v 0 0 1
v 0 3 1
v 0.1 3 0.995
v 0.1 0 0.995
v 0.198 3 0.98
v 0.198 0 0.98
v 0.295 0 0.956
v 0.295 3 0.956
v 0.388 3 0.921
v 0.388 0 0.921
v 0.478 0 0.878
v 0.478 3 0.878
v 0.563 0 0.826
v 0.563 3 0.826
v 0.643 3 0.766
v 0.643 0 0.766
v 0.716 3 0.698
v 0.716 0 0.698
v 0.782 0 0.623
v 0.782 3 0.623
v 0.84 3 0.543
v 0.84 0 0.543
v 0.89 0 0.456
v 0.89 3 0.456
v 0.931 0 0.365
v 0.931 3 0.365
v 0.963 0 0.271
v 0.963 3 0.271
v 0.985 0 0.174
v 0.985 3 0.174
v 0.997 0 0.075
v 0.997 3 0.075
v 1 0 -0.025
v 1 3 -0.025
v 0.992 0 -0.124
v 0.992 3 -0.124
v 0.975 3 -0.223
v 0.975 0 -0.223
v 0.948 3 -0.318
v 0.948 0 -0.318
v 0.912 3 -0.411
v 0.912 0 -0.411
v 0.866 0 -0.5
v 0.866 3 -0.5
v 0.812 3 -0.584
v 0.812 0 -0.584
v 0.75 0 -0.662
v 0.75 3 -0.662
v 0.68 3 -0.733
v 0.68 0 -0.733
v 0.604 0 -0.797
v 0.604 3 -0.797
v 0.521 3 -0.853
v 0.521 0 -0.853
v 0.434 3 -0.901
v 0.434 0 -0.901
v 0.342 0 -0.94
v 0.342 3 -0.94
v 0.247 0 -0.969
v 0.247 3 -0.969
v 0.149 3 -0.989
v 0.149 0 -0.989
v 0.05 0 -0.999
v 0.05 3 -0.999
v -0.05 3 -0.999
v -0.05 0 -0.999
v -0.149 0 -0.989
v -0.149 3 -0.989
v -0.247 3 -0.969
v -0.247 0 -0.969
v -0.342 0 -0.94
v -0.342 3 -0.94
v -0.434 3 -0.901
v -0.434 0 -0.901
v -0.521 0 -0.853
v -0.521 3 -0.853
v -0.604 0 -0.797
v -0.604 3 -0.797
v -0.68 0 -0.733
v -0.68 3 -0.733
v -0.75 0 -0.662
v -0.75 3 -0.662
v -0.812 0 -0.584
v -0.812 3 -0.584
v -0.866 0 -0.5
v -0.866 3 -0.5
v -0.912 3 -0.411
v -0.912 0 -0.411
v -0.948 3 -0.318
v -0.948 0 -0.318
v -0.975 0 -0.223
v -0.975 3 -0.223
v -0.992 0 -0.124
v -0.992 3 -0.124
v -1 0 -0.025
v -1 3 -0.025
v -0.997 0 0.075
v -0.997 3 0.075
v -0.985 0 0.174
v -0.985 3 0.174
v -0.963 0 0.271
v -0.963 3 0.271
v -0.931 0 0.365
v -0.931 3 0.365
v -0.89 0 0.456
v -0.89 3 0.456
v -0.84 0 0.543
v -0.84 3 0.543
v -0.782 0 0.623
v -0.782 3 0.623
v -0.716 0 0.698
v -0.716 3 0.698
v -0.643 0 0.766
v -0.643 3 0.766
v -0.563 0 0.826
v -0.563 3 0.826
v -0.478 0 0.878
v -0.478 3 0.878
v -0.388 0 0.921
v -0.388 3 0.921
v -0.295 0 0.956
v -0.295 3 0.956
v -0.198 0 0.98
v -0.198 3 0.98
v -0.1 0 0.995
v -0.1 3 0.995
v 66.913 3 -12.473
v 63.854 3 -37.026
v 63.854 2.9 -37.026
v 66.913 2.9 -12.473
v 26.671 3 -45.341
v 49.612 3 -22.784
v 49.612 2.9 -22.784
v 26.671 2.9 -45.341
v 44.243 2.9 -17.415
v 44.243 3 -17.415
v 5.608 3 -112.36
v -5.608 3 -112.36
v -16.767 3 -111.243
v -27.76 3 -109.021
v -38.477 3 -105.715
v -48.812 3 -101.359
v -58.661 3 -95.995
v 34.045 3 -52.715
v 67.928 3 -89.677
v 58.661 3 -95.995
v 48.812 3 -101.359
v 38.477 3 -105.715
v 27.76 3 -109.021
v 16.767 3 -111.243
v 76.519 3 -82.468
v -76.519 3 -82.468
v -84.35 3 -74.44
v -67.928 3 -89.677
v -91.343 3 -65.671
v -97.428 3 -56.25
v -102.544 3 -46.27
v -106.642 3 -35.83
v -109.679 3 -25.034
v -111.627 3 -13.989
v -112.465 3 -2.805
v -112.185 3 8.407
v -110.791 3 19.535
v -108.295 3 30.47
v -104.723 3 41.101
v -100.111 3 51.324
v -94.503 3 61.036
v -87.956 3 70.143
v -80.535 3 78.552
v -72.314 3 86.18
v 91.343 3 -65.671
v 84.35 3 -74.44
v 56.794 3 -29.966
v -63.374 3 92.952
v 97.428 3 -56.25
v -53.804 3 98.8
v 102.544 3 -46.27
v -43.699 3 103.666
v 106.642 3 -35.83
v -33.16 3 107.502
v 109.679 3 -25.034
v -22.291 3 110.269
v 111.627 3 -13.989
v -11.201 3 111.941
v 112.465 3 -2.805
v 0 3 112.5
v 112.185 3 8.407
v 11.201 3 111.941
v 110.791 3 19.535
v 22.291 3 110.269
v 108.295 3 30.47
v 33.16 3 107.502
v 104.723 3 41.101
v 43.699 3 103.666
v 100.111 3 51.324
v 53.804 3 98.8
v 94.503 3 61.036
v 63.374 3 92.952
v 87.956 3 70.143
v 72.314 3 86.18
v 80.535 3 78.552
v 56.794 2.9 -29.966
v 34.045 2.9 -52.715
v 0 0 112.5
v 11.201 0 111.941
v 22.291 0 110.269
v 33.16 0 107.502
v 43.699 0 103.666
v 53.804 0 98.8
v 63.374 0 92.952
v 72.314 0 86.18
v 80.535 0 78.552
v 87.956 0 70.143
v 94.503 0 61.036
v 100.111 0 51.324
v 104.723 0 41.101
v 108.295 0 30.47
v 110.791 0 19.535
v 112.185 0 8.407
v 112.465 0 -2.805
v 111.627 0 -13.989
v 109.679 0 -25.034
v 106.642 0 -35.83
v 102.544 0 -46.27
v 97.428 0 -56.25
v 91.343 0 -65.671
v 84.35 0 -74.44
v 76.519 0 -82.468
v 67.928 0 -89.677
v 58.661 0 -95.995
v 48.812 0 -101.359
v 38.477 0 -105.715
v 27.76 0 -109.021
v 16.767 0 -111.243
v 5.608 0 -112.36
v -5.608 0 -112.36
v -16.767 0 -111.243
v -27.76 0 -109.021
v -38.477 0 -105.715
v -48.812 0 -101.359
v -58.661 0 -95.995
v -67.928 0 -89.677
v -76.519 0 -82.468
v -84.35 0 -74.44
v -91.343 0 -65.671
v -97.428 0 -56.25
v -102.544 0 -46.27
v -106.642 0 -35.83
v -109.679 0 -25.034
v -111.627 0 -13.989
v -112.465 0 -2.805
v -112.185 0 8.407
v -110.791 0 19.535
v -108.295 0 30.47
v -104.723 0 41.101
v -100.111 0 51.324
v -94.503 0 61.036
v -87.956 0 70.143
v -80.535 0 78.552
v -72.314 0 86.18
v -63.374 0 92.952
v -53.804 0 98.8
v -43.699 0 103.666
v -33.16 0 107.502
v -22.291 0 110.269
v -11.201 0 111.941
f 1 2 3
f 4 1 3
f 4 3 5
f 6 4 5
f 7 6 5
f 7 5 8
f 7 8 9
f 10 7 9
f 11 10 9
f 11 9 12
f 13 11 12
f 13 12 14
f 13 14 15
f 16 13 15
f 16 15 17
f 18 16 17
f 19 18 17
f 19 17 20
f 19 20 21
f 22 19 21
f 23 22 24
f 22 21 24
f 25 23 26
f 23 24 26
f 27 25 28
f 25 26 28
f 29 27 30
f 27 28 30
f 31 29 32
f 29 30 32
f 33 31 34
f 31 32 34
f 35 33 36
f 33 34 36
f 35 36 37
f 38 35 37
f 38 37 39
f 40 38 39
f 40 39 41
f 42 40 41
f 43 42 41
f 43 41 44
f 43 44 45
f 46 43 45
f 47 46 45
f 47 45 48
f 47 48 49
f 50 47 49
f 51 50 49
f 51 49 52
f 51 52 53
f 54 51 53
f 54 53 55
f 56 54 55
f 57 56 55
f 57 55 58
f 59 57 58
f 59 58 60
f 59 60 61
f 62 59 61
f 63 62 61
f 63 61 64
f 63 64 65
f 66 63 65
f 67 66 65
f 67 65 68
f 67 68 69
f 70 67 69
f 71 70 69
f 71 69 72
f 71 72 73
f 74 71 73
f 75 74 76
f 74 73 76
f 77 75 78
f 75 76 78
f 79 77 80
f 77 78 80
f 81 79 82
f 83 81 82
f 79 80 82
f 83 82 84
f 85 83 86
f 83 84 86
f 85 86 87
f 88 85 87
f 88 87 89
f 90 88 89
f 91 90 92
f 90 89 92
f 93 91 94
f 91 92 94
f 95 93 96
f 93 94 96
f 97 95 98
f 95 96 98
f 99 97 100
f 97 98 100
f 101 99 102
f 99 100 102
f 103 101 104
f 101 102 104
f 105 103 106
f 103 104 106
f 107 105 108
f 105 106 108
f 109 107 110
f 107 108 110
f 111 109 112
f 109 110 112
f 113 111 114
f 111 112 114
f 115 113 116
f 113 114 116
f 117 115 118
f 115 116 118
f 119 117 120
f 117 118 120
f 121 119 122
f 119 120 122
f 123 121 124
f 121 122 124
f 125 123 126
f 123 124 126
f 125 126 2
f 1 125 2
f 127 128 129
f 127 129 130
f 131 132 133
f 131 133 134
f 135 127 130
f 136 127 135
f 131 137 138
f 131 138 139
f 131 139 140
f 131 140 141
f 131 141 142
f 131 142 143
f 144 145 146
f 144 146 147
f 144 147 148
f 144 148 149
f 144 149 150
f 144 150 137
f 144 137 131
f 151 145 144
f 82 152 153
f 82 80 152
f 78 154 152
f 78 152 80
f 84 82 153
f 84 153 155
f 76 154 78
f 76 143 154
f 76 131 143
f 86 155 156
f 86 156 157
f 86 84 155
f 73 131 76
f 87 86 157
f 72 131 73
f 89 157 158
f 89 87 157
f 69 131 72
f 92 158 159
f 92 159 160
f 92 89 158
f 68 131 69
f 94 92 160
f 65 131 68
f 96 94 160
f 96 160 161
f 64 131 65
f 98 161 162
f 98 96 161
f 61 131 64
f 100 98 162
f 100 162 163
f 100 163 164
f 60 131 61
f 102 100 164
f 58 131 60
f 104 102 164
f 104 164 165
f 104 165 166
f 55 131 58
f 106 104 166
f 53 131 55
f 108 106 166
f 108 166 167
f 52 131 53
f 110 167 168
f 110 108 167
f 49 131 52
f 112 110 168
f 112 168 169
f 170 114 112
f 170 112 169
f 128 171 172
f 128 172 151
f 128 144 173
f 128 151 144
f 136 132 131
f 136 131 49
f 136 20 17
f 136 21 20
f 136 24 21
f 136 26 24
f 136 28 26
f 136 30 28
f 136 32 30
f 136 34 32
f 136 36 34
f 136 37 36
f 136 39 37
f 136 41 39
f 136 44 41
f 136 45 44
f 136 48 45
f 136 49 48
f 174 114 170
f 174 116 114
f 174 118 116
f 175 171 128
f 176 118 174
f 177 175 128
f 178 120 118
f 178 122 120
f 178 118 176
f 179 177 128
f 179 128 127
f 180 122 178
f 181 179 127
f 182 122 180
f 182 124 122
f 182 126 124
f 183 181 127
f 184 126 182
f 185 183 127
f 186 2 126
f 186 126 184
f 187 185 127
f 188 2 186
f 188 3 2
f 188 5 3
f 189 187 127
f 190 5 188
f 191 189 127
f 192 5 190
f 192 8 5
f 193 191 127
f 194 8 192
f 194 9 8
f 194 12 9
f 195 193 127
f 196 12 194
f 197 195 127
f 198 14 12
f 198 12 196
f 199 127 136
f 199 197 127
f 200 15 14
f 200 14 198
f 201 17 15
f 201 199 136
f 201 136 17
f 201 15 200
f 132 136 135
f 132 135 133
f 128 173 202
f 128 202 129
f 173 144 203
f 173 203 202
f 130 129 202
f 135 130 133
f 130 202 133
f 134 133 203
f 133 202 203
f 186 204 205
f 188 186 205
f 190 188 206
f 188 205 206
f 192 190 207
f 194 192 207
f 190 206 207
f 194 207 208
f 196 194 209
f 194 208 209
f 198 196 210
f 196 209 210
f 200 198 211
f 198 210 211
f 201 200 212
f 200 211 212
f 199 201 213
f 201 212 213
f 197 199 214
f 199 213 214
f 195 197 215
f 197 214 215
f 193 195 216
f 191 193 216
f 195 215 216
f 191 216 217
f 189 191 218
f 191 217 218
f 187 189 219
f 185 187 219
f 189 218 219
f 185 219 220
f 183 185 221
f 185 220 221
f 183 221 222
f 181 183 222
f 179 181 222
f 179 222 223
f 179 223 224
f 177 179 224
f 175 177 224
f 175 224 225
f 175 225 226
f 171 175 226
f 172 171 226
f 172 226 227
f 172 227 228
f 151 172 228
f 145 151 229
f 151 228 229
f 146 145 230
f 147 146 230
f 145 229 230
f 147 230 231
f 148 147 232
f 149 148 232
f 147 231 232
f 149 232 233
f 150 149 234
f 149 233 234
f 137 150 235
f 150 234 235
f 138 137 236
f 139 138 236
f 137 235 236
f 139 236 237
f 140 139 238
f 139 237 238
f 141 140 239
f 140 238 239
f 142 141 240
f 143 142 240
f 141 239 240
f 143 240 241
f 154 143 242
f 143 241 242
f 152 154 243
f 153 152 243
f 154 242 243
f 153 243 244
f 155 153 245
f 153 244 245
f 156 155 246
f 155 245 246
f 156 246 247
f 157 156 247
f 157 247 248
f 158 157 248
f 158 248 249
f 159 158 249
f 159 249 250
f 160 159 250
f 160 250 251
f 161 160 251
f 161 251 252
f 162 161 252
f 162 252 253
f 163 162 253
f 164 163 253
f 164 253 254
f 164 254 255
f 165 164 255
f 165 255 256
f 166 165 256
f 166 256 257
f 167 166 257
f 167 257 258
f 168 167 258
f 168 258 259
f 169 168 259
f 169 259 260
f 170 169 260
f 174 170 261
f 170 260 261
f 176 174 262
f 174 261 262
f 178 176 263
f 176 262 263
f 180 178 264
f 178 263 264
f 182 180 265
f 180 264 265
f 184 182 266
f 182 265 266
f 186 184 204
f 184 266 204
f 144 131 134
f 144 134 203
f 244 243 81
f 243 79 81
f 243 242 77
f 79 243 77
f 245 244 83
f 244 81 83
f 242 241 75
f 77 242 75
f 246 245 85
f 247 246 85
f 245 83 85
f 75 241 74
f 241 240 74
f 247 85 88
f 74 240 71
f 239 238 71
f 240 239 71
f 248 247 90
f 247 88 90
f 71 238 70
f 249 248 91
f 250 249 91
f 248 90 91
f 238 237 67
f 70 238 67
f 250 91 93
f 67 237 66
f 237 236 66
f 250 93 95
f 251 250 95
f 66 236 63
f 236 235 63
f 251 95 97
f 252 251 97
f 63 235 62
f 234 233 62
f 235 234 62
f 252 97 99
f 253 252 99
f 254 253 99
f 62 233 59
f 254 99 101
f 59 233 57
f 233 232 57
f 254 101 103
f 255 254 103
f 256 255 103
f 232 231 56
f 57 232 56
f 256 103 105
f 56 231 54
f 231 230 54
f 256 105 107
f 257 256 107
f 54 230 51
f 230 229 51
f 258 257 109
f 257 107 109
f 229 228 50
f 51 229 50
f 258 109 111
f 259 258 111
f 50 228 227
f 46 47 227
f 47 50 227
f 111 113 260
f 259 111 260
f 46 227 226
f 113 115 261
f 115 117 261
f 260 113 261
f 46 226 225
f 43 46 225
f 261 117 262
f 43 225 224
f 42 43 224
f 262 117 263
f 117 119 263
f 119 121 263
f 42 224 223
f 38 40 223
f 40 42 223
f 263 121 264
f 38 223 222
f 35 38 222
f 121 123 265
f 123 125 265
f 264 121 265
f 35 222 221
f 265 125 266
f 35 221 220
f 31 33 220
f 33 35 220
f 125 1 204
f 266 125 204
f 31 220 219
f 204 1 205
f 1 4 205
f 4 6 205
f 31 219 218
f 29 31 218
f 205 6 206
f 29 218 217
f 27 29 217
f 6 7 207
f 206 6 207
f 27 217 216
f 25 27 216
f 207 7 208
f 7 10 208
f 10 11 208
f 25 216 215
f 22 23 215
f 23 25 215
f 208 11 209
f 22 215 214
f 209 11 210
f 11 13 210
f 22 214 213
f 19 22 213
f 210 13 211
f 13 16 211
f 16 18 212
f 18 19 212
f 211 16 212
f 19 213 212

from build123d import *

# Parameters (mm, degrees)
CROQUIS2_R              = 112.5
SALIENTE_EXTRUIR1_DEPTH = 3
CORTAR_EXTRUIR1_REACH   = 161.127
CROQUIS3_R              = 1
CORTAR_EXTRUIR2_DEPTH   = 0.1


with BuildPart() as part:
    # Croquis2 → Saliente-Extruir1 (new body)
    with BuildSketch(Plane(origin=(0, 0, 0), x_dir=(1, 0, 0), z_dir=(0, 1, 0))):
        with Locations(Location((0, 0, 0), (0, 0, 270))):
            Circle(CROQUIS2_R)
    extrude(amount=SALIENTE_EXTRUIR1_DEPTH)

    # Croquis3 → Cortar-Extruir1 (cut, up to next)
    with BuildSketch(Plane(origin=(0, 3, 0), x_dir=(1, 0, 0), z_dir=(0, 1, 0)), mode=Mode.PRIVATE) as cortar_extruir1_sk1:
        with Locations(Location((0, 0, 0), (0, 0, 270))):
            Circle(CROQUIS3_R)
    cortar_extruir1_tool1 = extrude(cortar_extruir1_sk1.sketch, amount=-CORTAR_EXTRUIR1_REACH, mode=Mode.PRIVATE) & part.part
    add(cortar_extruir1_tool1.solids().sort_by_distance((0, 3, 0))[0], mode=Mode.SUBTRACT)

    # Croquis4 → Cortar-Extruir2 (cut)
    with BuildSketch(Plane(origin=(0, 3, 0), x_dir=(1, 0, 0), z_dir=(0, 1, 0))):
        Polygon((26.671111852, 45.340890148), (34.044889835, 52.714668131), (56.793779355, 29.96577861), (63.853779551, 37.025778806), (66.91311297, 12.472667013), (44.242667896, 17.41466715), (49.612104379, 22.784103634), align=None)
    extrude(amount=-CORTAR_EXTRUIR2_DEPTH, mode=Mode.SUBTRACT)


solid = part.part
